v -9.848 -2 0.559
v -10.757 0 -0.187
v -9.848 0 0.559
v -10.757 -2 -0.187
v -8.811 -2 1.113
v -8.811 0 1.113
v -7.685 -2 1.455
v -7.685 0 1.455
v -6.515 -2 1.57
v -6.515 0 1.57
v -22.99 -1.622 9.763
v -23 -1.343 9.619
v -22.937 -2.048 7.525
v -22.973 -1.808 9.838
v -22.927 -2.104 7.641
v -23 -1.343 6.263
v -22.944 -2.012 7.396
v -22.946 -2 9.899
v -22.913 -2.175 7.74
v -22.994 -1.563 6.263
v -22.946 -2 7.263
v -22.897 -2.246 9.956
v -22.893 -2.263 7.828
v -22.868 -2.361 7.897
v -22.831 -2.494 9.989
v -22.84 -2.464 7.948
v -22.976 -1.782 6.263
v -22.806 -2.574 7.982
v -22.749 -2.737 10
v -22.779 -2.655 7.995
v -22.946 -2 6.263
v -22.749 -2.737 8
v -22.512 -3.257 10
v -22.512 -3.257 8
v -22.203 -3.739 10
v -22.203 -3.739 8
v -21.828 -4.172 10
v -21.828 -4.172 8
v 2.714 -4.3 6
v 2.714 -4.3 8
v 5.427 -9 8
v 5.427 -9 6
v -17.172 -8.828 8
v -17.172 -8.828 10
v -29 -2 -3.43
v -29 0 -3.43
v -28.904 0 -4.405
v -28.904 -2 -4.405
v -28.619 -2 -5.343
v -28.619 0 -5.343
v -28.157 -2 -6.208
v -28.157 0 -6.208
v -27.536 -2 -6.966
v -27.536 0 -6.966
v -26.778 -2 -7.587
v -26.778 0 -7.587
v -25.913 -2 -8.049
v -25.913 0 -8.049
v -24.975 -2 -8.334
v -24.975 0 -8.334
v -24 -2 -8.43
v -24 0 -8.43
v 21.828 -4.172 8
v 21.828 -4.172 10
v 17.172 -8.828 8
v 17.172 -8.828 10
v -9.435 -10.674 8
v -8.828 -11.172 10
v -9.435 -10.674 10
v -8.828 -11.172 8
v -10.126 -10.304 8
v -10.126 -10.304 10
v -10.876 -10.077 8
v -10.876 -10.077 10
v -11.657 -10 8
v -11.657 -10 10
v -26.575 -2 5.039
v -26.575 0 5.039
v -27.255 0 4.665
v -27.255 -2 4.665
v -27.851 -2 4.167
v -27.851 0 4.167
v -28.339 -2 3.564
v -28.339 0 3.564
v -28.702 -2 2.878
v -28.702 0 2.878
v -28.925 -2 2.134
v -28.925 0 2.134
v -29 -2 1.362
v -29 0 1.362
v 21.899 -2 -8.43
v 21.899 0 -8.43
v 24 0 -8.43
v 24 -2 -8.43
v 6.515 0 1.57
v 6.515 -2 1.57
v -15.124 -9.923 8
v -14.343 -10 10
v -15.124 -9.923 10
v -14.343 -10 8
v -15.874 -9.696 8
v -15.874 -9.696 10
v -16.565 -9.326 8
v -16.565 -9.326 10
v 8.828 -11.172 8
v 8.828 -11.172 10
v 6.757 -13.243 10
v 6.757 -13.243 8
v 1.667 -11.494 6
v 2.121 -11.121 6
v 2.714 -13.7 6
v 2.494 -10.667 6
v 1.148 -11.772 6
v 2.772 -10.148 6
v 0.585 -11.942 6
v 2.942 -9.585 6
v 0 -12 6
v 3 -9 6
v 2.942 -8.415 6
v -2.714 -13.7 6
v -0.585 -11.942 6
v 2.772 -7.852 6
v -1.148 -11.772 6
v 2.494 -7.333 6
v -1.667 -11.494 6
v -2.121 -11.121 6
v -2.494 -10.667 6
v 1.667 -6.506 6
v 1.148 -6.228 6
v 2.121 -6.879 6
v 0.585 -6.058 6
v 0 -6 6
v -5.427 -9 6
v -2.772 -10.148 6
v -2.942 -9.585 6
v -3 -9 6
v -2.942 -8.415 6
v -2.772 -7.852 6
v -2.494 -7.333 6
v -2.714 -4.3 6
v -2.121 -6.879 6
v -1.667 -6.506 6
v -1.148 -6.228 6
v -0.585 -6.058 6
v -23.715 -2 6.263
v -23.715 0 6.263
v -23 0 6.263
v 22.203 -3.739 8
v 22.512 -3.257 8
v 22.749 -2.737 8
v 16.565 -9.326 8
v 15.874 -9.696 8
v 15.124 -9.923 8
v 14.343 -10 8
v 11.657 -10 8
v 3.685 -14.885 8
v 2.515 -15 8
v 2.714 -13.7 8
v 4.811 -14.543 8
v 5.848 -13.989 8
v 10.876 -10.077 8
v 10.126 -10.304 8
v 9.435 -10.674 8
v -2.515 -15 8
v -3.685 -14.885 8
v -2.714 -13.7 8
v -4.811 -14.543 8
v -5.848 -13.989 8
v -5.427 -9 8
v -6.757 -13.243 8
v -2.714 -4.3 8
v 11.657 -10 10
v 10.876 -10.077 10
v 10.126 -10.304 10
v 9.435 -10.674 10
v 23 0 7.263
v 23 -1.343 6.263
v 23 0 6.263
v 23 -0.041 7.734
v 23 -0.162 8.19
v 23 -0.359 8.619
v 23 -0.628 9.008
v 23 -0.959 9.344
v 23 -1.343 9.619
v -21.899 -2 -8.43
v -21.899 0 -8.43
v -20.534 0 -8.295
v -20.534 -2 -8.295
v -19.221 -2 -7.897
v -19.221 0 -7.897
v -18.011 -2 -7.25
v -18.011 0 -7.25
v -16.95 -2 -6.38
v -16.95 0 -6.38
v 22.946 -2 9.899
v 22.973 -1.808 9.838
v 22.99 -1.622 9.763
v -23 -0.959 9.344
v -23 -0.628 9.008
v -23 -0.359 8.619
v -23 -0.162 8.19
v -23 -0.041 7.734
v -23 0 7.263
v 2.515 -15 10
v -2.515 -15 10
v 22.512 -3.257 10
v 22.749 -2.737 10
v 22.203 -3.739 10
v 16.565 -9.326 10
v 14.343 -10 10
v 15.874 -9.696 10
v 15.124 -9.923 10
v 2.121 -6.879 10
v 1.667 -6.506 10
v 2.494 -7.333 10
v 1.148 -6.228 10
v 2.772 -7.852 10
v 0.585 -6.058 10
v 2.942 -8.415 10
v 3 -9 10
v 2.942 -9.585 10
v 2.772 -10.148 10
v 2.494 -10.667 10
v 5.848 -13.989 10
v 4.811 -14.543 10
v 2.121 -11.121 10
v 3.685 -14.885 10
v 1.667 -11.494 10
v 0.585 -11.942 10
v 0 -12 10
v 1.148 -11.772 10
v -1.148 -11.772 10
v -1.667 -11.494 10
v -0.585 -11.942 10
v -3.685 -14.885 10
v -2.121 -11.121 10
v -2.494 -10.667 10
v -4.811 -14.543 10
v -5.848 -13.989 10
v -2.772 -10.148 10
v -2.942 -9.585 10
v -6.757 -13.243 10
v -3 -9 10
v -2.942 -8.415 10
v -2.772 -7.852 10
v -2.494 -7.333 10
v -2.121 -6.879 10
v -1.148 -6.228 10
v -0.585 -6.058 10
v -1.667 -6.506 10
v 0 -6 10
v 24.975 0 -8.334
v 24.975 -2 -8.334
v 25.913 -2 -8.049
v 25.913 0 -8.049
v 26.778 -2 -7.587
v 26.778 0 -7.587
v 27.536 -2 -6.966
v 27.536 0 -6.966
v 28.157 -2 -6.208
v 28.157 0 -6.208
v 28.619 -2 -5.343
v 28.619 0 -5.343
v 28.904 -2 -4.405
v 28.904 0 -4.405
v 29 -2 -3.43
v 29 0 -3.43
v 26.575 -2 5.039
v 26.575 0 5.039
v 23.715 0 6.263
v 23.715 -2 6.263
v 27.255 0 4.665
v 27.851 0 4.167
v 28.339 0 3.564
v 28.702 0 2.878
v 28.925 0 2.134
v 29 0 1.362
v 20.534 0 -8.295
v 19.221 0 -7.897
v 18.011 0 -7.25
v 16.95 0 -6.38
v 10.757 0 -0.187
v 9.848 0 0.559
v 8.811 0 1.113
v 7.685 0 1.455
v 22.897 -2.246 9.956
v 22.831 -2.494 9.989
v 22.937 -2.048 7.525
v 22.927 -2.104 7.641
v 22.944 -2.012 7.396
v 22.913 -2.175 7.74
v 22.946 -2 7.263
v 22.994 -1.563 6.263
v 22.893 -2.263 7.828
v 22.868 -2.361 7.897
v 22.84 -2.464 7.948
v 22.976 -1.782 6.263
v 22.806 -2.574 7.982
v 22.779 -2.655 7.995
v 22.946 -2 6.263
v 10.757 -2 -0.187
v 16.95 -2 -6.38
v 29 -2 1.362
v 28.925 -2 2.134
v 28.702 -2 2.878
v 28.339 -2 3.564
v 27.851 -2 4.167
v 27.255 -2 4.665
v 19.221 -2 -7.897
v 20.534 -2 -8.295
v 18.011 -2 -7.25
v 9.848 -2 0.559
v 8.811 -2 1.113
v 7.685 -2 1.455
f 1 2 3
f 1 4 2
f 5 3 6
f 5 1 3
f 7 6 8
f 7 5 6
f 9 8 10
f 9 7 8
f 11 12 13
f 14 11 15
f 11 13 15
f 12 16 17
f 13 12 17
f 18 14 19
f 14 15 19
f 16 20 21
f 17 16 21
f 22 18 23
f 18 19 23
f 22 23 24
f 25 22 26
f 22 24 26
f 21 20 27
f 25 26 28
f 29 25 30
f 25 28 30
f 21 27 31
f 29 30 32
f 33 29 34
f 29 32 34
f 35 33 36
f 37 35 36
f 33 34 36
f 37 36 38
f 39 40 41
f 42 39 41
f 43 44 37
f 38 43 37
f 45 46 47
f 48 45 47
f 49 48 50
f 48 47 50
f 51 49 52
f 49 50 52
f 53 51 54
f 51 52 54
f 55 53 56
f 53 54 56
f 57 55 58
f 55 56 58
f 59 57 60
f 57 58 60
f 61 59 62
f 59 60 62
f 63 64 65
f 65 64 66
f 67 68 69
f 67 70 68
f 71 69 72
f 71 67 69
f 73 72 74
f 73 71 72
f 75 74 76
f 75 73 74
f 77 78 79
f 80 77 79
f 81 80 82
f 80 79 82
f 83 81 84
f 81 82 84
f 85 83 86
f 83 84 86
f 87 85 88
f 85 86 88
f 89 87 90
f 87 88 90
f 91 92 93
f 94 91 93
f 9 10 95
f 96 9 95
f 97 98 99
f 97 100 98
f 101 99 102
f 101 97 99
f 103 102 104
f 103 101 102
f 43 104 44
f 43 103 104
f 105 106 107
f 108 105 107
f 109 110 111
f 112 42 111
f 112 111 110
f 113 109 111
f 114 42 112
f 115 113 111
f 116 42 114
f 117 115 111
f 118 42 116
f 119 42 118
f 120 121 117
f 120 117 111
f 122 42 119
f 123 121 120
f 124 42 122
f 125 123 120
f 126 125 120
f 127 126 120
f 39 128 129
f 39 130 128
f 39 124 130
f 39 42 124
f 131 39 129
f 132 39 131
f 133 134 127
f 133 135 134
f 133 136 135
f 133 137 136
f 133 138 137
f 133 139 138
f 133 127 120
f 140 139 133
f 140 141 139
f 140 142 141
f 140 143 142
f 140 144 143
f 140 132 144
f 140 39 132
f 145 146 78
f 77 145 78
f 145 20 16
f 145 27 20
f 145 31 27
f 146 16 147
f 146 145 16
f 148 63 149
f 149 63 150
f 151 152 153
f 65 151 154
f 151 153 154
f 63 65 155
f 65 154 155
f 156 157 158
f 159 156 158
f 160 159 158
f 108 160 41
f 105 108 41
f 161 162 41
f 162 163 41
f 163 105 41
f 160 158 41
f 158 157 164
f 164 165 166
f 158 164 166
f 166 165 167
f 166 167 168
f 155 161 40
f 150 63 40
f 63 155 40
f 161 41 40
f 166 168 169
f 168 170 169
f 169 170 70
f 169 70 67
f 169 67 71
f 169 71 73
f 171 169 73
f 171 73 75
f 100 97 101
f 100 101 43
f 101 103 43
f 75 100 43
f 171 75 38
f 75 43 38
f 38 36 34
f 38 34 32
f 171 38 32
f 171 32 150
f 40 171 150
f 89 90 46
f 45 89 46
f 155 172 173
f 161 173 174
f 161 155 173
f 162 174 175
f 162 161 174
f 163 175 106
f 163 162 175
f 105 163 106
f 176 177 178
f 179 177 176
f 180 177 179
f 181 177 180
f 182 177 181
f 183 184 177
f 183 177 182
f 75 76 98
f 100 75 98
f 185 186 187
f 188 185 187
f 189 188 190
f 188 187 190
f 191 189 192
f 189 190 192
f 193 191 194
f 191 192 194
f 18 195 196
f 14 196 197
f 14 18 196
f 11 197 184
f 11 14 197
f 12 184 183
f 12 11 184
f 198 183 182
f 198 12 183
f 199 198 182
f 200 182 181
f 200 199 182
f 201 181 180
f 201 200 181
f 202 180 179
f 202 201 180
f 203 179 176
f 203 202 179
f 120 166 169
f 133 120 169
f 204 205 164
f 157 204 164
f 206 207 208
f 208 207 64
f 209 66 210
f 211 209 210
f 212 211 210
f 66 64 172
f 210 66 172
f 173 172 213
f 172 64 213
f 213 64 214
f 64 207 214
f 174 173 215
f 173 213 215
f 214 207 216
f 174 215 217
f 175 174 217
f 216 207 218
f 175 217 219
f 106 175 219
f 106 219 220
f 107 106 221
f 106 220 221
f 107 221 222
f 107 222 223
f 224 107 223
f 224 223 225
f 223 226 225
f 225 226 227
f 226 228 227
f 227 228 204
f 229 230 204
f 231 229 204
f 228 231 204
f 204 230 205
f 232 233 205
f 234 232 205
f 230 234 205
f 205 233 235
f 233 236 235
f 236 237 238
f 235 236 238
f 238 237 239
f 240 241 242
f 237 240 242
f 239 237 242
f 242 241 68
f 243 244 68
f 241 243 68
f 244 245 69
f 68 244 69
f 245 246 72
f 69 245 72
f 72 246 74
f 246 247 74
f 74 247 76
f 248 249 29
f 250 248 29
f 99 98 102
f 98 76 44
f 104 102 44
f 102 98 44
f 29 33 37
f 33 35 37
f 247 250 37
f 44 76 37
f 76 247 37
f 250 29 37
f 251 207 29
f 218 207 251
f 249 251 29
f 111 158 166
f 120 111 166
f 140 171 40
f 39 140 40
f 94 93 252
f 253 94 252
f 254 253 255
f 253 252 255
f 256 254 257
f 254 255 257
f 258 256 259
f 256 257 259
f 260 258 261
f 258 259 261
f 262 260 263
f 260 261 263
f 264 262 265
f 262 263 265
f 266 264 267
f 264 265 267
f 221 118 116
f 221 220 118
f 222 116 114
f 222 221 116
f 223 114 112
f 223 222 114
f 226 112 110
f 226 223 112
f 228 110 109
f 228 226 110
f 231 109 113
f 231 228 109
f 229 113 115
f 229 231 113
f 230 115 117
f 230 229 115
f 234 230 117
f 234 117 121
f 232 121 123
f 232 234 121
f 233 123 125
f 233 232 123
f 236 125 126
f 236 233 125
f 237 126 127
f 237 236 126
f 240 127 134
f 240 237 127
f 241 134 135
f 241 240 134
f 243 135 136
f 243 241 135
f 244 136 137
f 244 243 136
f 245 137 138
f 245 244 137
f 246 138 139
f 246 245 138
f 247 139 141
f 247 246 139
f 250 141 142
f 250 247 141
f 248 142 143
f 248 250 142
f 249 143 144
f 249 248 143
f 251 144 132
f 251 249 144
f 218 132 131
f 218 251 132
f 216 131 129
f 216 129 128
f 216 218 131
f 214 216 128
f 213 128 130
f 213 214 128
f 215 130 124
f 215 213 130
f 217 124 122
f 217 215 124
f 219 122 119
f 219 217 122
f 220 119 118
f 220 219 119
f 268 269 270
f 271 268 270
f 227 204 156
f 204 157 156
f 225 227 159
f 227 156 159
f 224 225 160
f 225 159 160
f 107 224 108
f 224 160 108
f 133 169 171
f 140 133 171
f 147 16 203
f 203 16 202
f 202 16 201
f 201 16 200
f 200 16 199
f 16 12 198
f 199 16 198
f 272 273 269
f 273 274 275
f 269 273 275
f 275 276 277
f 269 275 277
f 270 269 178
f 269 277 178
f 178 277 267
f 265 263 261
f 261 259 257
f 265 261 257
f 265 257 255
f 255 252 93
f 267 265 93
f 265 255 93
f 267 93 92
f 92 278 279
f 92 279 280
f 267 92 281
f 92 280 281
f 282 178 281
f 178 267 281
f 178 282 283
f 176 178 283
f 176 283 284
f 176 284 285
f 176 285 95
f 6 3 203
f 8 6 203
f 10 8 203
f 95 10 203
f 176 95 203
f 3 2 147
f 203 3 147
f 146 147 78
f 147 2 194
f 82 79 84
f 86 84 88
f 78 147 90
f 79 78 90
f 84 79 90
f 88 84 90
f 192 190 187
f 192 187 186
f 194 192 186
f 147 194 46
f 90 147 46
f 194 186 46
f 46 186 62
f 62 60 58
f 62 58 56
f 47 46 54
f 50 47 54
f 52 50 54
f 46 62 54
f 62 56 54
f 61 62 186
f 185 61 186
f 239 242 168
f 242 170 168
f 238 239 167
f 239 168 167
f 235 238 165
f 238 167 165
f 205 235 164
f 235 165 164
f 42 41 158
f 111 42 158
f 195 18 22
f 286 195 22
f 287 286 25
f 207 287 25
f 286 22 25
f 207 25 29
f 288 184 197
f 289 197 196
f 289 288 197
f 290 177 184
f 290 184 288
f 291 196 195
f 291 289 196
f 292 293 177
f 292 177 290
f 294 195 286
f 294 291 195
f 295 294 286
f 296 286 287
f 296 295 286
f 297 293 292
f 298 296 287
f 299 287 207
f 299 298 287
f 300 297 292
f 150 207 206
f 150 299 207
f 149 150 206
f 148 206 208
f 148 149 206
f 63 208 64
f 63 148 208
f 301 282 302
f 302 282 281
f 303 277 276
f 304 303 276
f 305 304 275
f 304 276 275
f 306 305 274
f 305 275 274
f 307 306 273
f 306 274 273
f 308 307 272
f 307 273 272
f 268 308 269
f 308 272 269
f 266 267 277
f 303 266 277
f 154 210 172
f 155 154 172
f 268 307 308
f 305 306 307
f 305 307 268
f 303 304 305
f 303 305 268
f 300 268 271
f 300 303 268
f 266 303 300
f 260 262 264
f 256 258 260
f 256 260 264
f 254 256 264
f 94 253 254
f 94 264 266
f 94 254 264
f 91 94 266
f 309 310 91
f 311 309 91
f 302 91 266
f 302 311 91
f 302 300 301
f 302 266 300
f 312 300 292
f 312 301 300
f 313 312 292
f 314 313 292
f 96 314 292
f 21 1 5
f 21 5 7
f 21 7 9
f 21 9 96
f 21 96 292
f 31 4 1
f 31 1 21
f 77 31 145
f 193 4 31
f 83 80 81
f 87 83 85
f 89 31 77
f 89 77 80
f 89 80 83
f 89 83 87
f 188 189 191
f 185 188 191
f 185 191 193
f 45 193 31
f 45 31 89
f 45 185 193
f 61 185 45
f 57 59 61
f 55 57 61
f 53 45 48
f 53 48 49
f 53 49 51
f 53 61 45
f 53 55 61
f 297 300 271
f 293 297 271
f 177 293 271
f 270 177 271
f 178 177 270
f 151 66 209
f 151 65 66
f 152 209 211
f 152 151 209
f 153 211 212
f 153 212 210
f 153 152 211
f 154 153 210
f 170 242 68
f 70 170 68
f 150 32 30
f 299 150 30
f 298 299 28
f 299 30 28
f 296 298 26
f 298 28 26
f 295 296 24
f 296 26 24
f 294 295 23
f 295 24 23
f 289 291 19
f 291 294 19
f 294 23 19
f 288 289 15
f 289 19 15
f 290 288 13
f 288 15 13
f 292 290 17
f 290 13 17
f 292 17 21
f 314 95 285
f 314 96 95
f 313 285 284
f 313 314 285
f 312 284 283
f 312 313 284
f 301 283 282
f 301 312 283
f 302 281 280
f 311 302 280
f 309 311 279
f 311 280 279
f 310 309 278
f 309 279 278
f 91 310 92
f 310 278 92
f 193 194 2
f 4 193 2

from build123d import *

# Parameters (mm, degrees)
BASE_FLANGE1_DEPTH   = 2
EDGE_FLANGE1_START   = -23
EDGE_FLANGE1_DEPTH   = 46
EDGE_FLANGE1_START_2 = -23.714787909
EDGE_FLANGE1_2_DEPTH = 0.714787909
EDGE_FLANGE1_START_3 = 23
EDGE_FLANGE1_3_DEPTH = 0.714787909
EDGE_FLANGE1_4_DEPTH = 46
CUT_EXTRUDE1_DEPTH   = 10
FILLET1_R            = 4
FILLET2_R            = 6
SKETCH9_R            = 3
CUT_EXTRUDE2_DEPTH   = 10
SKETCH10_R           = 3
BOSS_EXTRUDE1_DEPTH  = 2


# Read off the part's stored shape, not the designer's step: Edge-Flange1
# Sheet-metal steps are written as plain solids
with BuildPart() as part:
    # Sketch1 → Base-Flange1 (new body)
    with BuildSketch(Plane(origin=(0, 0, 0), x_dir=(1, 0, 0), z_dir=(0, 1, 0))):
        with BuildLine():
            Line((-16.949747468, 6.379735664), (-9, -1.570011804))
            Line((-9, -1.570011804), (9, -1.570011804))
            Line((9, -1.570011804), (16.949747468, 6.379735664))
            ThreePointArc((16.949747468, 6.379735664), (19.22071091, 7.897144924), (21.899494937, 8.429988196))
            Line((21.899494937, 8.429988196), (24, 8.429988196))
            ThreePointArc((24, 8.429988196), (27.535533906, 6.965522102), (29, 3.429988196))
            Line((29, 3.429988196), (29, -1.361639596))
            ThreePointArc((29, -1.361639596), (28.339066725, -3.564054954), (26.574683296, -5.038645514))
            Line((26.574683296, -5.038645514), (23, -6.569508994))
            Line((23, -6.569508994), (23, -10))
            Line((23, -10), (-23, -10))
            Line((-23, -10), (-23, -6.569508994))
            Line((-23, -6.569508994), (-26.574683296, -5.038645514))
            ThreePointArc((-26.574683296, -5.038645514), (-28.339066725, -3.564054954), (-29, -1.361639596))
            Line((-29, -1.361639596), (-29, 3.429988196))
            ThreePointArc((-29, 3.429988196), (-27.535533906, 6.965522102), (-24, 8.429988196))
            Line((-24, 8.429988196), (-21.899494937, 8.429988196))
            ThreePointArc((-21.899494937, 8.429988196), (-19.22071091, 7.897144924), (-16.949747468, 6.379735664))
        make_face()
    extrude(amount=-BASE_FLANGE1_DEPTH)

    # Edge-Flange1 outline → Edge-Flange1 (cut)
    with BuildSketch(Plane.YZ.offset(EDGE_FLANGE1_START)):
        with BuildLine():
            ThreePointArc((-2, 9.899002398), (-0.556604688, 8.917667209), (0, 7.2634))
            Line((0, 7.2634), (0, 10))
            Line((0, 10), (-2, 10))
            Line((-2, 10), (-2, 9.899002398))
        make_face()
    extrude(amount=EDGE_FLANGE1_DEPTH, mode=Mode.SUBTRACT)

    # Edge-Flange1 2 outline → Edge-Flange1 2 (cut)
    with BuildSketch(Plane.YZ.offset(EDGE_FLANGE1_START_2)):
        with BuildLine():
            Line((-2, 6.2634), (0, 6.2634))
            Line((0, 6.2634), (0, 7.2634))
            ThreePointArc((0, 7.2634), (-0.556604688, 8.917667209), (-2, 9.899002398))
            Line((-2, 9.899002398), (-2, 6.2634))
        make_face()
    extrude(amount=EDGE_FLANGE1_2_DEPTH, mode=Mode.SUBTRACT)

    # Edge-Flange1 3 outline → Edge-Flange1 3 (cut)
    with BuildSketch(Plane.YZ.offset(EDGE_FLANGE1_START_3)):
        with BuildLine():
            Line((-2, 6.2634), (0, 6.2634))
            Line((0, 6.2634), (0, 7.2634))
            ThreePointArc((0, 7.2634), (-0.556604688, 8.917667209), (-2, 9.899002398))
            Line((-2, 9.899002398), (-2, 6.2634))
        make_face()
    extrude(amount=EDGE_FLANGE1_3_DEPTH, mode=Mode.SUBTRACT)

    # Edge-Flange1 4 outline → Edge-Flange1 4 (add)
    with BuildSketch(Plane.YZ.offset(EDGE_FLANGE1_START)):
        with BuildLine():
            ThreePointArc((-2.7366, 8), (-2.215745145, 7.784254855), (-2, 7.2634))
            Line((-2, 7.2634), (-2, 9.899002398))
            ThreePointArc((-2, 9.899002398), (-2.364854094, 9.974633029), (-2.7366, 10))
            Line((-2.7366, 10), (-15, 10))
            Line((-15, 10), (-15, 8))
            Line((-15, 8), (-2.7366, 8))
        make_face()
    extrude(amount=EDGE_FLANGE1_4_DEPTH)

    # Sketch8 → Cut-Extrude1 (cut)
    with BuildSketch(Plane.XY.offset(10)):
        Polygon((-16, -10), (-23, -3), (-23, -15), (-5, -15), (-10, -10), align=None)
        Polygon((10, -10), (5, -15), (23, -15), (23, -3), (16, -10), align=None)
    extrude(amount=-CUT_EXTRUDE1_DEPTH, mode=Mode.SUBTRACT)

    # Fillet1
    fillet1_edges = [part.edges().sort_by_distance(p)[0] for p in [
        (-23, -3, 9),
        (-16, -10, 9),
        (-10, -10, 9),
        (10, -10, 9),
        (16, -10, 9),
        (23, -3, 9),
    ]]
    fillet(fillet1_edges, radius=FILLET1_R)

    # Fillet2
    fillet2_edges = [part.edges().sort_by_distance(p)[0] for p in [
        (-5, -15, 9),
        (5, -15, 9),
        (9, -1, 1.570011804),
        (-9, -1, 1.570011804),
    ]]
    fillet(fillet2_edges, radius=FILLET2_R)

    # Sketch9 → Cut-Extrude2 (cut)
    with BuildSketch(Plane.XY.offset(10)):
        with Locations((0, -9)):
            Circle(SKETCH9_R)
    extrude(amount=-CUT_EXTRUDE2_DEPTH, mode=Mode.SUBTRACT)

    # Sketch10 → Boss-Extrude1 (add)
    with BuildSketch(Plane(origin=(0, 0, 8), x_dir=(-1, 0, 0), z_dir=(0, 0, -1))):
        Polygon((5.42709253, -9), (2.713546265, -4.3), (-2.713546265, -4.3), (-5.42709253, -9), (-2.713546265, -13.7), (2.713546265, -13.7), align=None)
        with Locations(Location((0, -9, 0), (0, 0, 180))):
            Circle(SKETCH10_R, mode=Mode.SUBTRACT)
    extrude(amount=BOSS_EXTRUDE1_DEPTH)


solid = part.part
